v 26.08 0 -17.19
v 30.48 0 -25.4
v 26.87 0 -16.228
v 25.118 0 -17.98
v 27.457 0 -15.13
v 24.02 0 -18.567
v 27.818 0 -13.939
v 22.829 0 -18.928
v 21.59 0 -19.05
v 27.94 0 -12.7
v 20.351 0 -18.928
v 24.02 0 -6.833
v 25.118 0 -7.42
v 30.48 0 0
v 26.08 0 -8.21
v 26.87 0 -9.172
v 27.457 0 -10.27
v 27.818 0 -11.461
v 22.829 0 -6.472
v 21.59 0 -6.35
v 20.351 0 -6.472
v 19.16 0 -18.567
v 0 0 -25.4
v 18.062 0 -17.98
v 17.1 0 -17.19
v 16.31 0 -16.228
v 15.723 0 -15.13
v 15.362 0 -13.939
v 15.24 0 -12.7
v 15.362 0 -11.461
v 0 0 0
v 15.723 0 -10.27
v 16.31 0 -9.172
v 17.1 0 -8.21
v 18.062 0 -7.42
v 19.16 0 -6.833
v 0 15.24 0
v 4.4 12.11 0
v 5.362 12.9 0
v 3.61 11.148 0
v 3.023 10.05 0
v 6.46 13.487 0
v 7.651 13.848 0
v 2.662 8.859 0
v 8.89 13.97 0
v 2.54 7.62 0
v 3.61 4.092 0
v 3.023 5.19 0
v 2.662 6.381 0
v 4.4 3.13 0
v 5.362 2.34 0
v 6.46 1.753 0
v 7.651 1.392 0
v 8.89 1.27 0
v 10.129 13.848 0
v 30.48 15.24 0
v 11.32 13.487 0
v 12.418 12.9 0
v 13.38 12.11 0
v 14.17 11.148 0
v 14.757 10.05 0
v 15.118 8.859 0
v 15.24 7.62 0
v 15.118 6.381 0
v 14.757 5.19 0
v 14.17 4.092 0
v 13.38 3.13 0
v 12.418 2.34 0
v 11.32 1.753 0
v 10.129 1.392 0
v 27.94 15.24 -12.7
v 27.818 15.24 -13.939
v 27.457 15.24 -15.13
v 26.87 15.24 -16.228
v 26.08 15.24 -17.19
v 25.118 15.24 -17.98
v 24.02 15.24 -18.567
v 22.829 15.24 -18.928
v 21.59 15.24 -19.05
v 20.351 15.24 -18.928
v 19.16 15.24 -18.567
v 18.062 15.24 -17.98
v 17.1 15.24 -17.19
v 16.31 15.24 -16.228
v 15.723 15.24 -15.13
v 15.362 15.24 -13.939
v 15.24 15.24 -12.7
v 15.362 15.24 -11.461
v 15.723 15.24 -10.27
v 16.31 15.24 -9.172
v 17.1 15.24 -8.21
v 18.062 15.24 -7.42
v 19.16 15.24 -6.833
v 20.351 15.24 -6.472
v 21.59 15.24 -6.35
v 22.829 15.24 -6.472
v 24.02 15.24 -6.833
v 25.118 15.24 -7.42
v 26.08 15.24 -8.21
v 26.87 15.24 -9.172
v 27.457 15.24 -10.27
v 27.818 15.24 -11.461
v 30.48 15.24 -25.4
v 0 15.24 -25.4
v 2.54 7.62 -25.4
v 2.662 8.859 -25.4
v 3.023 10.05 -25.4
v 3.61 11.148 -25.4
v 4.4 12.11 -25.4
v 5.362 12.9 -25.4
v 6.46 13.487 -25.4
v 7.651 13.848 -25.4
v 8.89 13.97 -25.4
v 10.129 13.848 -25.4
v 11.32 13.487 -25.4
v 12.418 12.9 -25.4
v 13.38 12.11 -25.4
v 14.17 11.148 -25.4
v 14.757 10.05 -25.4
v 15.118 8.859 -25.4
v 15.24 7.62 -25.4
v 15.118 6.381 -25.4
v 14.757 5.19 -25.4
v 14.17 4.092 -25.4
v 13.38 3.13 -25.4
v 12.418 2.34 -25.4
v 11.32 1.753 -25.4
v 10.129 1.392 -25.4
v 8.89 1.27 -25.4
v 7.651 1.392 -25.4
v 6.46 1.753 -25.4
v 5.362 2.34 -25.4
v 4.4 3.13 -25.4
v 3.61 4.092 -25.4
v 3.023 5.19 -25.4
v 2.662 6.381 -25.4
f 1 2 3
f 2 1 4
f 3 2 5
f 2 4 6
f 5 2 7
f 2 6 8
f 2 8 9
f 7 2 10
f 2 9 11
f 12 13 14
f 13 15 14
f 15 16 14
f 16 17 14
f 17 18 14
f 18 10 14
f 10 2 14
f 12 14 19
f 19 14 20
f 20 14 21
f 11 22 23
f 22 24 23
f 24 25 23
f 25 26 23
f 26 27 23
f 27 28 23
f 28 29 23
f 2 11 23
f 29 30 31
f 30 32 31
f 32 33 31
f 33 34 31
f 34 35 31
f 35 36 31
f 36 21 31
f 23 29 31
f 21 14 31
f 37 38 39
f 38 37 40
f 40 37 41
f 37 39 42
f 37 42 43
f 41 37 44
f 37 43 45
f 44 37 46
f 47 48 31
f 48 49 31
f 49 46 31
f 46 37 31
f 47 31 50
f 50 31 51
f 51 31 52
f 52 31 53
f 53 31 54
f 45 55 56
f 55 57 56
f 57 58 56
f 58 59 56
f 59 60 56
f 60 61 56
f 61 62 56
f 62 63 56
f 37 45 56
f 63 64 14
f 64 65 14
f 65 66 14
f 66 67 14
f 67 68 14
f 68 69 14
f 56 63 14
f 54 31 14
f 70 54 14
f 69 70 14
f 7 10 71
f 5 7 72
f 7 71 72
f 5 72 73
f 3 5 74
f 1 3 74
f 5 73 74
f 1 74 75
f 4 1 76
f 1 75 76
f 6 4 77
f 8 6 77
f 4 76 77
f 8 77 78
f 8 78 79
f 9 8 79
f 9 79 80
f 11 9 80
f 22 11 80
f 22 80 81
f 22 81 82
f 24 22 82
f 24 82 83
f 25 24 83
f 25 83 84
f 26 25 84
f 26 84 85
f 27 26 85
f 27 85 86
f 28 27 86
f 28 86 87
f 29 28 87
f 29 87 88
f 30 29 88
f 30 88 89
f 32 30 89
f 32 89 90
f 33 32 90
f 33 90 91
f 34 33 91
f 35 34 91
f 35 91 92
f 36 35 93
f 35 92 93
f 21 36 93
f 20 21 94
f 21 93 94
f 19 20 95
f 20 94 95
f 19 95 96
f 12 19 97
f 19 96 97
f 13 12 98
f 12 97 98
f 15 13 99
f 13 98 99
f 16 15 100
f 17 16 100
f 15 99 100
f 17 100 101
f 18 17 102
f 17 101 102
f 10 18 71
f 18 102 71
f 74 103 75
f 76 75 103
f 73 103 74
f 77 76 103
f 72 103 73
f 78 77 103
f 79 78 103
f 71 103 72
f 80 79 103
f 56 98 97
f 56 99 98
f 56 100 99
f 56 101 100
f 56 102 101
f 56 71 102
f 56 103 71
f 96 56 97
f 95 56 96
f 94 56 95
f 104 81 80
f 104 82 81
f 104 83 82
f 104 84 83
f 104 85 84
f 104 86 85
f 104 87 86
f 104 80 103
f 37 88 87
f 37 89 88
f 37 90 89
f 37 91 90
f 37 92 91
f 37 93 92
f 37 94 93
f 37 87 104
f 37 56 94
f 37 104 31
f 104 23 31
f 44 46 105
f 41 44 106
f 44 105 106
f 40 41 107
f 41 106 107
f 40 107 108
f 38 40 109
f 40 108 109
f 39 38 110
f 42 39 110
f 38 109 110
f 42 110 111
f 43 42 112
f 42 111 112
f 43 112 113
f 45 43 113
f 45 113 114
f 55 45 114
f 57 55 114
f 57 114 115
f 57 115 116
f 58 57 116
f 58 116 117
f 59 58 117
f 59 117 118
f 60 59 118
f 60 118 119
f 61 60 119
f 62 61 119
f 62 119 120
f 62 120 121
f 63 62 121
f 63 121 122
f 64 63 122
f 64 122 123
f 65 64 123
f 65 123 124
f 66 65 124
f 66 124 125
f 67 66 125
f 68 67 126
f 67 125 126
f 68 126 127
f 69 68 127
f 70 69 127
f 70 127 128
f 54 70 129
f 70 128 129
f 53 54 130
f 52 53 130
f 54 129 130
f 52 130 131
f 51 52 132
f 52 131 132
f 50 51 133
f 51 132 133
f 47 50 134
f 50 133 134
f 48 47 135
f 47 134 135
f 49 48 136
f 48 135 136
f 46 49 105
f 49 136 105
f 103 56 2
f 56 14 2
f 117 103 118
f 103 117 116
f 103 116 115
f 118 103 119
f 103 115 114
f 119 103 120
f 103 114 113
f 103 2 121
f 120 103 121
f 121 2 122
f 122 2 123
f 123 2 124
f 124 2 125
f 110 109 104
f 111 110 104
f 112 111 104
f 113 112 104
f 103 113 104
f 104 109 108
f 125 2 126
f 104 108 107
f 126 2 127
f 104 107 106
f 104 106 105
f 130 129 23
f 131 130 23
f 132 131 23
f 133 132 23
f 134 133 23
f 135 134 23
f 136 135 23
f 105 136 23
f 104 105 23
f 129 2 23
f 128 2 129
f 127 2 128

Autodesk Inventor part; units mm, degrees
ref_plane "YZ Plane" through (0, 0, 0) normal (1, 0, 0) x (0, 1, 0)
ref_plane "XZ Plane" through (0, 0, 0) normal (0, 1, 0) x (-1, 0, 0)
ref_plane "XY Plane" through (0, 0, 0) normal (0, 0, 1) x (1, 0, 0)
sketch "Sketch1" plane through (0, 0, 0) normal (0, 1, 0) x (-1, 0, 0)
  line L0 (0, 0) -> (-30.48, 0)
  line L1 (-30.48, 0) -> (-30.48, -25.4)
  line L2 (-30.48, -25.4) -> (0, -25.4)
  line L3 (0, -25.4) -> (0, 0)
  dimension "d0" = 30.48
  dimension "d1" = 25.4
extrude "Extrusion1" add sketch "Sketch1" along normal blind 15.24
sketch "Sketch4" plane through (30.48, 0, -25.4) normal (0, 0, -1) x (-1, 0, 0)
  circle A0 centre (21.59, 7.62) radius 6.35
  line L0 (30.48, 0) -> (30.48, 15.24) projected
  dimension "d14" = 12.7
  dimension "d15" = 8.89
extrude "Extrusion4" cut sketch "Sketch4" against normal blind 25.4
sketch "Sketch5" plane through (0, 15.24, 0) normal (0, 1, 0) x (1, 0, 0)
  circle A0 centre (21.59, 12.7) radius 6.35
  line L0 (30.48, 0) -> (30.48, 25.4) projected
  point P0 (0, 0)
  dimension "d18" = 12.7
  dimension "d19" = 8.89
extrude "Extrusion5" cut sketch "Sketch5" against normal blind 15.24
properties part number "Pivot point"
